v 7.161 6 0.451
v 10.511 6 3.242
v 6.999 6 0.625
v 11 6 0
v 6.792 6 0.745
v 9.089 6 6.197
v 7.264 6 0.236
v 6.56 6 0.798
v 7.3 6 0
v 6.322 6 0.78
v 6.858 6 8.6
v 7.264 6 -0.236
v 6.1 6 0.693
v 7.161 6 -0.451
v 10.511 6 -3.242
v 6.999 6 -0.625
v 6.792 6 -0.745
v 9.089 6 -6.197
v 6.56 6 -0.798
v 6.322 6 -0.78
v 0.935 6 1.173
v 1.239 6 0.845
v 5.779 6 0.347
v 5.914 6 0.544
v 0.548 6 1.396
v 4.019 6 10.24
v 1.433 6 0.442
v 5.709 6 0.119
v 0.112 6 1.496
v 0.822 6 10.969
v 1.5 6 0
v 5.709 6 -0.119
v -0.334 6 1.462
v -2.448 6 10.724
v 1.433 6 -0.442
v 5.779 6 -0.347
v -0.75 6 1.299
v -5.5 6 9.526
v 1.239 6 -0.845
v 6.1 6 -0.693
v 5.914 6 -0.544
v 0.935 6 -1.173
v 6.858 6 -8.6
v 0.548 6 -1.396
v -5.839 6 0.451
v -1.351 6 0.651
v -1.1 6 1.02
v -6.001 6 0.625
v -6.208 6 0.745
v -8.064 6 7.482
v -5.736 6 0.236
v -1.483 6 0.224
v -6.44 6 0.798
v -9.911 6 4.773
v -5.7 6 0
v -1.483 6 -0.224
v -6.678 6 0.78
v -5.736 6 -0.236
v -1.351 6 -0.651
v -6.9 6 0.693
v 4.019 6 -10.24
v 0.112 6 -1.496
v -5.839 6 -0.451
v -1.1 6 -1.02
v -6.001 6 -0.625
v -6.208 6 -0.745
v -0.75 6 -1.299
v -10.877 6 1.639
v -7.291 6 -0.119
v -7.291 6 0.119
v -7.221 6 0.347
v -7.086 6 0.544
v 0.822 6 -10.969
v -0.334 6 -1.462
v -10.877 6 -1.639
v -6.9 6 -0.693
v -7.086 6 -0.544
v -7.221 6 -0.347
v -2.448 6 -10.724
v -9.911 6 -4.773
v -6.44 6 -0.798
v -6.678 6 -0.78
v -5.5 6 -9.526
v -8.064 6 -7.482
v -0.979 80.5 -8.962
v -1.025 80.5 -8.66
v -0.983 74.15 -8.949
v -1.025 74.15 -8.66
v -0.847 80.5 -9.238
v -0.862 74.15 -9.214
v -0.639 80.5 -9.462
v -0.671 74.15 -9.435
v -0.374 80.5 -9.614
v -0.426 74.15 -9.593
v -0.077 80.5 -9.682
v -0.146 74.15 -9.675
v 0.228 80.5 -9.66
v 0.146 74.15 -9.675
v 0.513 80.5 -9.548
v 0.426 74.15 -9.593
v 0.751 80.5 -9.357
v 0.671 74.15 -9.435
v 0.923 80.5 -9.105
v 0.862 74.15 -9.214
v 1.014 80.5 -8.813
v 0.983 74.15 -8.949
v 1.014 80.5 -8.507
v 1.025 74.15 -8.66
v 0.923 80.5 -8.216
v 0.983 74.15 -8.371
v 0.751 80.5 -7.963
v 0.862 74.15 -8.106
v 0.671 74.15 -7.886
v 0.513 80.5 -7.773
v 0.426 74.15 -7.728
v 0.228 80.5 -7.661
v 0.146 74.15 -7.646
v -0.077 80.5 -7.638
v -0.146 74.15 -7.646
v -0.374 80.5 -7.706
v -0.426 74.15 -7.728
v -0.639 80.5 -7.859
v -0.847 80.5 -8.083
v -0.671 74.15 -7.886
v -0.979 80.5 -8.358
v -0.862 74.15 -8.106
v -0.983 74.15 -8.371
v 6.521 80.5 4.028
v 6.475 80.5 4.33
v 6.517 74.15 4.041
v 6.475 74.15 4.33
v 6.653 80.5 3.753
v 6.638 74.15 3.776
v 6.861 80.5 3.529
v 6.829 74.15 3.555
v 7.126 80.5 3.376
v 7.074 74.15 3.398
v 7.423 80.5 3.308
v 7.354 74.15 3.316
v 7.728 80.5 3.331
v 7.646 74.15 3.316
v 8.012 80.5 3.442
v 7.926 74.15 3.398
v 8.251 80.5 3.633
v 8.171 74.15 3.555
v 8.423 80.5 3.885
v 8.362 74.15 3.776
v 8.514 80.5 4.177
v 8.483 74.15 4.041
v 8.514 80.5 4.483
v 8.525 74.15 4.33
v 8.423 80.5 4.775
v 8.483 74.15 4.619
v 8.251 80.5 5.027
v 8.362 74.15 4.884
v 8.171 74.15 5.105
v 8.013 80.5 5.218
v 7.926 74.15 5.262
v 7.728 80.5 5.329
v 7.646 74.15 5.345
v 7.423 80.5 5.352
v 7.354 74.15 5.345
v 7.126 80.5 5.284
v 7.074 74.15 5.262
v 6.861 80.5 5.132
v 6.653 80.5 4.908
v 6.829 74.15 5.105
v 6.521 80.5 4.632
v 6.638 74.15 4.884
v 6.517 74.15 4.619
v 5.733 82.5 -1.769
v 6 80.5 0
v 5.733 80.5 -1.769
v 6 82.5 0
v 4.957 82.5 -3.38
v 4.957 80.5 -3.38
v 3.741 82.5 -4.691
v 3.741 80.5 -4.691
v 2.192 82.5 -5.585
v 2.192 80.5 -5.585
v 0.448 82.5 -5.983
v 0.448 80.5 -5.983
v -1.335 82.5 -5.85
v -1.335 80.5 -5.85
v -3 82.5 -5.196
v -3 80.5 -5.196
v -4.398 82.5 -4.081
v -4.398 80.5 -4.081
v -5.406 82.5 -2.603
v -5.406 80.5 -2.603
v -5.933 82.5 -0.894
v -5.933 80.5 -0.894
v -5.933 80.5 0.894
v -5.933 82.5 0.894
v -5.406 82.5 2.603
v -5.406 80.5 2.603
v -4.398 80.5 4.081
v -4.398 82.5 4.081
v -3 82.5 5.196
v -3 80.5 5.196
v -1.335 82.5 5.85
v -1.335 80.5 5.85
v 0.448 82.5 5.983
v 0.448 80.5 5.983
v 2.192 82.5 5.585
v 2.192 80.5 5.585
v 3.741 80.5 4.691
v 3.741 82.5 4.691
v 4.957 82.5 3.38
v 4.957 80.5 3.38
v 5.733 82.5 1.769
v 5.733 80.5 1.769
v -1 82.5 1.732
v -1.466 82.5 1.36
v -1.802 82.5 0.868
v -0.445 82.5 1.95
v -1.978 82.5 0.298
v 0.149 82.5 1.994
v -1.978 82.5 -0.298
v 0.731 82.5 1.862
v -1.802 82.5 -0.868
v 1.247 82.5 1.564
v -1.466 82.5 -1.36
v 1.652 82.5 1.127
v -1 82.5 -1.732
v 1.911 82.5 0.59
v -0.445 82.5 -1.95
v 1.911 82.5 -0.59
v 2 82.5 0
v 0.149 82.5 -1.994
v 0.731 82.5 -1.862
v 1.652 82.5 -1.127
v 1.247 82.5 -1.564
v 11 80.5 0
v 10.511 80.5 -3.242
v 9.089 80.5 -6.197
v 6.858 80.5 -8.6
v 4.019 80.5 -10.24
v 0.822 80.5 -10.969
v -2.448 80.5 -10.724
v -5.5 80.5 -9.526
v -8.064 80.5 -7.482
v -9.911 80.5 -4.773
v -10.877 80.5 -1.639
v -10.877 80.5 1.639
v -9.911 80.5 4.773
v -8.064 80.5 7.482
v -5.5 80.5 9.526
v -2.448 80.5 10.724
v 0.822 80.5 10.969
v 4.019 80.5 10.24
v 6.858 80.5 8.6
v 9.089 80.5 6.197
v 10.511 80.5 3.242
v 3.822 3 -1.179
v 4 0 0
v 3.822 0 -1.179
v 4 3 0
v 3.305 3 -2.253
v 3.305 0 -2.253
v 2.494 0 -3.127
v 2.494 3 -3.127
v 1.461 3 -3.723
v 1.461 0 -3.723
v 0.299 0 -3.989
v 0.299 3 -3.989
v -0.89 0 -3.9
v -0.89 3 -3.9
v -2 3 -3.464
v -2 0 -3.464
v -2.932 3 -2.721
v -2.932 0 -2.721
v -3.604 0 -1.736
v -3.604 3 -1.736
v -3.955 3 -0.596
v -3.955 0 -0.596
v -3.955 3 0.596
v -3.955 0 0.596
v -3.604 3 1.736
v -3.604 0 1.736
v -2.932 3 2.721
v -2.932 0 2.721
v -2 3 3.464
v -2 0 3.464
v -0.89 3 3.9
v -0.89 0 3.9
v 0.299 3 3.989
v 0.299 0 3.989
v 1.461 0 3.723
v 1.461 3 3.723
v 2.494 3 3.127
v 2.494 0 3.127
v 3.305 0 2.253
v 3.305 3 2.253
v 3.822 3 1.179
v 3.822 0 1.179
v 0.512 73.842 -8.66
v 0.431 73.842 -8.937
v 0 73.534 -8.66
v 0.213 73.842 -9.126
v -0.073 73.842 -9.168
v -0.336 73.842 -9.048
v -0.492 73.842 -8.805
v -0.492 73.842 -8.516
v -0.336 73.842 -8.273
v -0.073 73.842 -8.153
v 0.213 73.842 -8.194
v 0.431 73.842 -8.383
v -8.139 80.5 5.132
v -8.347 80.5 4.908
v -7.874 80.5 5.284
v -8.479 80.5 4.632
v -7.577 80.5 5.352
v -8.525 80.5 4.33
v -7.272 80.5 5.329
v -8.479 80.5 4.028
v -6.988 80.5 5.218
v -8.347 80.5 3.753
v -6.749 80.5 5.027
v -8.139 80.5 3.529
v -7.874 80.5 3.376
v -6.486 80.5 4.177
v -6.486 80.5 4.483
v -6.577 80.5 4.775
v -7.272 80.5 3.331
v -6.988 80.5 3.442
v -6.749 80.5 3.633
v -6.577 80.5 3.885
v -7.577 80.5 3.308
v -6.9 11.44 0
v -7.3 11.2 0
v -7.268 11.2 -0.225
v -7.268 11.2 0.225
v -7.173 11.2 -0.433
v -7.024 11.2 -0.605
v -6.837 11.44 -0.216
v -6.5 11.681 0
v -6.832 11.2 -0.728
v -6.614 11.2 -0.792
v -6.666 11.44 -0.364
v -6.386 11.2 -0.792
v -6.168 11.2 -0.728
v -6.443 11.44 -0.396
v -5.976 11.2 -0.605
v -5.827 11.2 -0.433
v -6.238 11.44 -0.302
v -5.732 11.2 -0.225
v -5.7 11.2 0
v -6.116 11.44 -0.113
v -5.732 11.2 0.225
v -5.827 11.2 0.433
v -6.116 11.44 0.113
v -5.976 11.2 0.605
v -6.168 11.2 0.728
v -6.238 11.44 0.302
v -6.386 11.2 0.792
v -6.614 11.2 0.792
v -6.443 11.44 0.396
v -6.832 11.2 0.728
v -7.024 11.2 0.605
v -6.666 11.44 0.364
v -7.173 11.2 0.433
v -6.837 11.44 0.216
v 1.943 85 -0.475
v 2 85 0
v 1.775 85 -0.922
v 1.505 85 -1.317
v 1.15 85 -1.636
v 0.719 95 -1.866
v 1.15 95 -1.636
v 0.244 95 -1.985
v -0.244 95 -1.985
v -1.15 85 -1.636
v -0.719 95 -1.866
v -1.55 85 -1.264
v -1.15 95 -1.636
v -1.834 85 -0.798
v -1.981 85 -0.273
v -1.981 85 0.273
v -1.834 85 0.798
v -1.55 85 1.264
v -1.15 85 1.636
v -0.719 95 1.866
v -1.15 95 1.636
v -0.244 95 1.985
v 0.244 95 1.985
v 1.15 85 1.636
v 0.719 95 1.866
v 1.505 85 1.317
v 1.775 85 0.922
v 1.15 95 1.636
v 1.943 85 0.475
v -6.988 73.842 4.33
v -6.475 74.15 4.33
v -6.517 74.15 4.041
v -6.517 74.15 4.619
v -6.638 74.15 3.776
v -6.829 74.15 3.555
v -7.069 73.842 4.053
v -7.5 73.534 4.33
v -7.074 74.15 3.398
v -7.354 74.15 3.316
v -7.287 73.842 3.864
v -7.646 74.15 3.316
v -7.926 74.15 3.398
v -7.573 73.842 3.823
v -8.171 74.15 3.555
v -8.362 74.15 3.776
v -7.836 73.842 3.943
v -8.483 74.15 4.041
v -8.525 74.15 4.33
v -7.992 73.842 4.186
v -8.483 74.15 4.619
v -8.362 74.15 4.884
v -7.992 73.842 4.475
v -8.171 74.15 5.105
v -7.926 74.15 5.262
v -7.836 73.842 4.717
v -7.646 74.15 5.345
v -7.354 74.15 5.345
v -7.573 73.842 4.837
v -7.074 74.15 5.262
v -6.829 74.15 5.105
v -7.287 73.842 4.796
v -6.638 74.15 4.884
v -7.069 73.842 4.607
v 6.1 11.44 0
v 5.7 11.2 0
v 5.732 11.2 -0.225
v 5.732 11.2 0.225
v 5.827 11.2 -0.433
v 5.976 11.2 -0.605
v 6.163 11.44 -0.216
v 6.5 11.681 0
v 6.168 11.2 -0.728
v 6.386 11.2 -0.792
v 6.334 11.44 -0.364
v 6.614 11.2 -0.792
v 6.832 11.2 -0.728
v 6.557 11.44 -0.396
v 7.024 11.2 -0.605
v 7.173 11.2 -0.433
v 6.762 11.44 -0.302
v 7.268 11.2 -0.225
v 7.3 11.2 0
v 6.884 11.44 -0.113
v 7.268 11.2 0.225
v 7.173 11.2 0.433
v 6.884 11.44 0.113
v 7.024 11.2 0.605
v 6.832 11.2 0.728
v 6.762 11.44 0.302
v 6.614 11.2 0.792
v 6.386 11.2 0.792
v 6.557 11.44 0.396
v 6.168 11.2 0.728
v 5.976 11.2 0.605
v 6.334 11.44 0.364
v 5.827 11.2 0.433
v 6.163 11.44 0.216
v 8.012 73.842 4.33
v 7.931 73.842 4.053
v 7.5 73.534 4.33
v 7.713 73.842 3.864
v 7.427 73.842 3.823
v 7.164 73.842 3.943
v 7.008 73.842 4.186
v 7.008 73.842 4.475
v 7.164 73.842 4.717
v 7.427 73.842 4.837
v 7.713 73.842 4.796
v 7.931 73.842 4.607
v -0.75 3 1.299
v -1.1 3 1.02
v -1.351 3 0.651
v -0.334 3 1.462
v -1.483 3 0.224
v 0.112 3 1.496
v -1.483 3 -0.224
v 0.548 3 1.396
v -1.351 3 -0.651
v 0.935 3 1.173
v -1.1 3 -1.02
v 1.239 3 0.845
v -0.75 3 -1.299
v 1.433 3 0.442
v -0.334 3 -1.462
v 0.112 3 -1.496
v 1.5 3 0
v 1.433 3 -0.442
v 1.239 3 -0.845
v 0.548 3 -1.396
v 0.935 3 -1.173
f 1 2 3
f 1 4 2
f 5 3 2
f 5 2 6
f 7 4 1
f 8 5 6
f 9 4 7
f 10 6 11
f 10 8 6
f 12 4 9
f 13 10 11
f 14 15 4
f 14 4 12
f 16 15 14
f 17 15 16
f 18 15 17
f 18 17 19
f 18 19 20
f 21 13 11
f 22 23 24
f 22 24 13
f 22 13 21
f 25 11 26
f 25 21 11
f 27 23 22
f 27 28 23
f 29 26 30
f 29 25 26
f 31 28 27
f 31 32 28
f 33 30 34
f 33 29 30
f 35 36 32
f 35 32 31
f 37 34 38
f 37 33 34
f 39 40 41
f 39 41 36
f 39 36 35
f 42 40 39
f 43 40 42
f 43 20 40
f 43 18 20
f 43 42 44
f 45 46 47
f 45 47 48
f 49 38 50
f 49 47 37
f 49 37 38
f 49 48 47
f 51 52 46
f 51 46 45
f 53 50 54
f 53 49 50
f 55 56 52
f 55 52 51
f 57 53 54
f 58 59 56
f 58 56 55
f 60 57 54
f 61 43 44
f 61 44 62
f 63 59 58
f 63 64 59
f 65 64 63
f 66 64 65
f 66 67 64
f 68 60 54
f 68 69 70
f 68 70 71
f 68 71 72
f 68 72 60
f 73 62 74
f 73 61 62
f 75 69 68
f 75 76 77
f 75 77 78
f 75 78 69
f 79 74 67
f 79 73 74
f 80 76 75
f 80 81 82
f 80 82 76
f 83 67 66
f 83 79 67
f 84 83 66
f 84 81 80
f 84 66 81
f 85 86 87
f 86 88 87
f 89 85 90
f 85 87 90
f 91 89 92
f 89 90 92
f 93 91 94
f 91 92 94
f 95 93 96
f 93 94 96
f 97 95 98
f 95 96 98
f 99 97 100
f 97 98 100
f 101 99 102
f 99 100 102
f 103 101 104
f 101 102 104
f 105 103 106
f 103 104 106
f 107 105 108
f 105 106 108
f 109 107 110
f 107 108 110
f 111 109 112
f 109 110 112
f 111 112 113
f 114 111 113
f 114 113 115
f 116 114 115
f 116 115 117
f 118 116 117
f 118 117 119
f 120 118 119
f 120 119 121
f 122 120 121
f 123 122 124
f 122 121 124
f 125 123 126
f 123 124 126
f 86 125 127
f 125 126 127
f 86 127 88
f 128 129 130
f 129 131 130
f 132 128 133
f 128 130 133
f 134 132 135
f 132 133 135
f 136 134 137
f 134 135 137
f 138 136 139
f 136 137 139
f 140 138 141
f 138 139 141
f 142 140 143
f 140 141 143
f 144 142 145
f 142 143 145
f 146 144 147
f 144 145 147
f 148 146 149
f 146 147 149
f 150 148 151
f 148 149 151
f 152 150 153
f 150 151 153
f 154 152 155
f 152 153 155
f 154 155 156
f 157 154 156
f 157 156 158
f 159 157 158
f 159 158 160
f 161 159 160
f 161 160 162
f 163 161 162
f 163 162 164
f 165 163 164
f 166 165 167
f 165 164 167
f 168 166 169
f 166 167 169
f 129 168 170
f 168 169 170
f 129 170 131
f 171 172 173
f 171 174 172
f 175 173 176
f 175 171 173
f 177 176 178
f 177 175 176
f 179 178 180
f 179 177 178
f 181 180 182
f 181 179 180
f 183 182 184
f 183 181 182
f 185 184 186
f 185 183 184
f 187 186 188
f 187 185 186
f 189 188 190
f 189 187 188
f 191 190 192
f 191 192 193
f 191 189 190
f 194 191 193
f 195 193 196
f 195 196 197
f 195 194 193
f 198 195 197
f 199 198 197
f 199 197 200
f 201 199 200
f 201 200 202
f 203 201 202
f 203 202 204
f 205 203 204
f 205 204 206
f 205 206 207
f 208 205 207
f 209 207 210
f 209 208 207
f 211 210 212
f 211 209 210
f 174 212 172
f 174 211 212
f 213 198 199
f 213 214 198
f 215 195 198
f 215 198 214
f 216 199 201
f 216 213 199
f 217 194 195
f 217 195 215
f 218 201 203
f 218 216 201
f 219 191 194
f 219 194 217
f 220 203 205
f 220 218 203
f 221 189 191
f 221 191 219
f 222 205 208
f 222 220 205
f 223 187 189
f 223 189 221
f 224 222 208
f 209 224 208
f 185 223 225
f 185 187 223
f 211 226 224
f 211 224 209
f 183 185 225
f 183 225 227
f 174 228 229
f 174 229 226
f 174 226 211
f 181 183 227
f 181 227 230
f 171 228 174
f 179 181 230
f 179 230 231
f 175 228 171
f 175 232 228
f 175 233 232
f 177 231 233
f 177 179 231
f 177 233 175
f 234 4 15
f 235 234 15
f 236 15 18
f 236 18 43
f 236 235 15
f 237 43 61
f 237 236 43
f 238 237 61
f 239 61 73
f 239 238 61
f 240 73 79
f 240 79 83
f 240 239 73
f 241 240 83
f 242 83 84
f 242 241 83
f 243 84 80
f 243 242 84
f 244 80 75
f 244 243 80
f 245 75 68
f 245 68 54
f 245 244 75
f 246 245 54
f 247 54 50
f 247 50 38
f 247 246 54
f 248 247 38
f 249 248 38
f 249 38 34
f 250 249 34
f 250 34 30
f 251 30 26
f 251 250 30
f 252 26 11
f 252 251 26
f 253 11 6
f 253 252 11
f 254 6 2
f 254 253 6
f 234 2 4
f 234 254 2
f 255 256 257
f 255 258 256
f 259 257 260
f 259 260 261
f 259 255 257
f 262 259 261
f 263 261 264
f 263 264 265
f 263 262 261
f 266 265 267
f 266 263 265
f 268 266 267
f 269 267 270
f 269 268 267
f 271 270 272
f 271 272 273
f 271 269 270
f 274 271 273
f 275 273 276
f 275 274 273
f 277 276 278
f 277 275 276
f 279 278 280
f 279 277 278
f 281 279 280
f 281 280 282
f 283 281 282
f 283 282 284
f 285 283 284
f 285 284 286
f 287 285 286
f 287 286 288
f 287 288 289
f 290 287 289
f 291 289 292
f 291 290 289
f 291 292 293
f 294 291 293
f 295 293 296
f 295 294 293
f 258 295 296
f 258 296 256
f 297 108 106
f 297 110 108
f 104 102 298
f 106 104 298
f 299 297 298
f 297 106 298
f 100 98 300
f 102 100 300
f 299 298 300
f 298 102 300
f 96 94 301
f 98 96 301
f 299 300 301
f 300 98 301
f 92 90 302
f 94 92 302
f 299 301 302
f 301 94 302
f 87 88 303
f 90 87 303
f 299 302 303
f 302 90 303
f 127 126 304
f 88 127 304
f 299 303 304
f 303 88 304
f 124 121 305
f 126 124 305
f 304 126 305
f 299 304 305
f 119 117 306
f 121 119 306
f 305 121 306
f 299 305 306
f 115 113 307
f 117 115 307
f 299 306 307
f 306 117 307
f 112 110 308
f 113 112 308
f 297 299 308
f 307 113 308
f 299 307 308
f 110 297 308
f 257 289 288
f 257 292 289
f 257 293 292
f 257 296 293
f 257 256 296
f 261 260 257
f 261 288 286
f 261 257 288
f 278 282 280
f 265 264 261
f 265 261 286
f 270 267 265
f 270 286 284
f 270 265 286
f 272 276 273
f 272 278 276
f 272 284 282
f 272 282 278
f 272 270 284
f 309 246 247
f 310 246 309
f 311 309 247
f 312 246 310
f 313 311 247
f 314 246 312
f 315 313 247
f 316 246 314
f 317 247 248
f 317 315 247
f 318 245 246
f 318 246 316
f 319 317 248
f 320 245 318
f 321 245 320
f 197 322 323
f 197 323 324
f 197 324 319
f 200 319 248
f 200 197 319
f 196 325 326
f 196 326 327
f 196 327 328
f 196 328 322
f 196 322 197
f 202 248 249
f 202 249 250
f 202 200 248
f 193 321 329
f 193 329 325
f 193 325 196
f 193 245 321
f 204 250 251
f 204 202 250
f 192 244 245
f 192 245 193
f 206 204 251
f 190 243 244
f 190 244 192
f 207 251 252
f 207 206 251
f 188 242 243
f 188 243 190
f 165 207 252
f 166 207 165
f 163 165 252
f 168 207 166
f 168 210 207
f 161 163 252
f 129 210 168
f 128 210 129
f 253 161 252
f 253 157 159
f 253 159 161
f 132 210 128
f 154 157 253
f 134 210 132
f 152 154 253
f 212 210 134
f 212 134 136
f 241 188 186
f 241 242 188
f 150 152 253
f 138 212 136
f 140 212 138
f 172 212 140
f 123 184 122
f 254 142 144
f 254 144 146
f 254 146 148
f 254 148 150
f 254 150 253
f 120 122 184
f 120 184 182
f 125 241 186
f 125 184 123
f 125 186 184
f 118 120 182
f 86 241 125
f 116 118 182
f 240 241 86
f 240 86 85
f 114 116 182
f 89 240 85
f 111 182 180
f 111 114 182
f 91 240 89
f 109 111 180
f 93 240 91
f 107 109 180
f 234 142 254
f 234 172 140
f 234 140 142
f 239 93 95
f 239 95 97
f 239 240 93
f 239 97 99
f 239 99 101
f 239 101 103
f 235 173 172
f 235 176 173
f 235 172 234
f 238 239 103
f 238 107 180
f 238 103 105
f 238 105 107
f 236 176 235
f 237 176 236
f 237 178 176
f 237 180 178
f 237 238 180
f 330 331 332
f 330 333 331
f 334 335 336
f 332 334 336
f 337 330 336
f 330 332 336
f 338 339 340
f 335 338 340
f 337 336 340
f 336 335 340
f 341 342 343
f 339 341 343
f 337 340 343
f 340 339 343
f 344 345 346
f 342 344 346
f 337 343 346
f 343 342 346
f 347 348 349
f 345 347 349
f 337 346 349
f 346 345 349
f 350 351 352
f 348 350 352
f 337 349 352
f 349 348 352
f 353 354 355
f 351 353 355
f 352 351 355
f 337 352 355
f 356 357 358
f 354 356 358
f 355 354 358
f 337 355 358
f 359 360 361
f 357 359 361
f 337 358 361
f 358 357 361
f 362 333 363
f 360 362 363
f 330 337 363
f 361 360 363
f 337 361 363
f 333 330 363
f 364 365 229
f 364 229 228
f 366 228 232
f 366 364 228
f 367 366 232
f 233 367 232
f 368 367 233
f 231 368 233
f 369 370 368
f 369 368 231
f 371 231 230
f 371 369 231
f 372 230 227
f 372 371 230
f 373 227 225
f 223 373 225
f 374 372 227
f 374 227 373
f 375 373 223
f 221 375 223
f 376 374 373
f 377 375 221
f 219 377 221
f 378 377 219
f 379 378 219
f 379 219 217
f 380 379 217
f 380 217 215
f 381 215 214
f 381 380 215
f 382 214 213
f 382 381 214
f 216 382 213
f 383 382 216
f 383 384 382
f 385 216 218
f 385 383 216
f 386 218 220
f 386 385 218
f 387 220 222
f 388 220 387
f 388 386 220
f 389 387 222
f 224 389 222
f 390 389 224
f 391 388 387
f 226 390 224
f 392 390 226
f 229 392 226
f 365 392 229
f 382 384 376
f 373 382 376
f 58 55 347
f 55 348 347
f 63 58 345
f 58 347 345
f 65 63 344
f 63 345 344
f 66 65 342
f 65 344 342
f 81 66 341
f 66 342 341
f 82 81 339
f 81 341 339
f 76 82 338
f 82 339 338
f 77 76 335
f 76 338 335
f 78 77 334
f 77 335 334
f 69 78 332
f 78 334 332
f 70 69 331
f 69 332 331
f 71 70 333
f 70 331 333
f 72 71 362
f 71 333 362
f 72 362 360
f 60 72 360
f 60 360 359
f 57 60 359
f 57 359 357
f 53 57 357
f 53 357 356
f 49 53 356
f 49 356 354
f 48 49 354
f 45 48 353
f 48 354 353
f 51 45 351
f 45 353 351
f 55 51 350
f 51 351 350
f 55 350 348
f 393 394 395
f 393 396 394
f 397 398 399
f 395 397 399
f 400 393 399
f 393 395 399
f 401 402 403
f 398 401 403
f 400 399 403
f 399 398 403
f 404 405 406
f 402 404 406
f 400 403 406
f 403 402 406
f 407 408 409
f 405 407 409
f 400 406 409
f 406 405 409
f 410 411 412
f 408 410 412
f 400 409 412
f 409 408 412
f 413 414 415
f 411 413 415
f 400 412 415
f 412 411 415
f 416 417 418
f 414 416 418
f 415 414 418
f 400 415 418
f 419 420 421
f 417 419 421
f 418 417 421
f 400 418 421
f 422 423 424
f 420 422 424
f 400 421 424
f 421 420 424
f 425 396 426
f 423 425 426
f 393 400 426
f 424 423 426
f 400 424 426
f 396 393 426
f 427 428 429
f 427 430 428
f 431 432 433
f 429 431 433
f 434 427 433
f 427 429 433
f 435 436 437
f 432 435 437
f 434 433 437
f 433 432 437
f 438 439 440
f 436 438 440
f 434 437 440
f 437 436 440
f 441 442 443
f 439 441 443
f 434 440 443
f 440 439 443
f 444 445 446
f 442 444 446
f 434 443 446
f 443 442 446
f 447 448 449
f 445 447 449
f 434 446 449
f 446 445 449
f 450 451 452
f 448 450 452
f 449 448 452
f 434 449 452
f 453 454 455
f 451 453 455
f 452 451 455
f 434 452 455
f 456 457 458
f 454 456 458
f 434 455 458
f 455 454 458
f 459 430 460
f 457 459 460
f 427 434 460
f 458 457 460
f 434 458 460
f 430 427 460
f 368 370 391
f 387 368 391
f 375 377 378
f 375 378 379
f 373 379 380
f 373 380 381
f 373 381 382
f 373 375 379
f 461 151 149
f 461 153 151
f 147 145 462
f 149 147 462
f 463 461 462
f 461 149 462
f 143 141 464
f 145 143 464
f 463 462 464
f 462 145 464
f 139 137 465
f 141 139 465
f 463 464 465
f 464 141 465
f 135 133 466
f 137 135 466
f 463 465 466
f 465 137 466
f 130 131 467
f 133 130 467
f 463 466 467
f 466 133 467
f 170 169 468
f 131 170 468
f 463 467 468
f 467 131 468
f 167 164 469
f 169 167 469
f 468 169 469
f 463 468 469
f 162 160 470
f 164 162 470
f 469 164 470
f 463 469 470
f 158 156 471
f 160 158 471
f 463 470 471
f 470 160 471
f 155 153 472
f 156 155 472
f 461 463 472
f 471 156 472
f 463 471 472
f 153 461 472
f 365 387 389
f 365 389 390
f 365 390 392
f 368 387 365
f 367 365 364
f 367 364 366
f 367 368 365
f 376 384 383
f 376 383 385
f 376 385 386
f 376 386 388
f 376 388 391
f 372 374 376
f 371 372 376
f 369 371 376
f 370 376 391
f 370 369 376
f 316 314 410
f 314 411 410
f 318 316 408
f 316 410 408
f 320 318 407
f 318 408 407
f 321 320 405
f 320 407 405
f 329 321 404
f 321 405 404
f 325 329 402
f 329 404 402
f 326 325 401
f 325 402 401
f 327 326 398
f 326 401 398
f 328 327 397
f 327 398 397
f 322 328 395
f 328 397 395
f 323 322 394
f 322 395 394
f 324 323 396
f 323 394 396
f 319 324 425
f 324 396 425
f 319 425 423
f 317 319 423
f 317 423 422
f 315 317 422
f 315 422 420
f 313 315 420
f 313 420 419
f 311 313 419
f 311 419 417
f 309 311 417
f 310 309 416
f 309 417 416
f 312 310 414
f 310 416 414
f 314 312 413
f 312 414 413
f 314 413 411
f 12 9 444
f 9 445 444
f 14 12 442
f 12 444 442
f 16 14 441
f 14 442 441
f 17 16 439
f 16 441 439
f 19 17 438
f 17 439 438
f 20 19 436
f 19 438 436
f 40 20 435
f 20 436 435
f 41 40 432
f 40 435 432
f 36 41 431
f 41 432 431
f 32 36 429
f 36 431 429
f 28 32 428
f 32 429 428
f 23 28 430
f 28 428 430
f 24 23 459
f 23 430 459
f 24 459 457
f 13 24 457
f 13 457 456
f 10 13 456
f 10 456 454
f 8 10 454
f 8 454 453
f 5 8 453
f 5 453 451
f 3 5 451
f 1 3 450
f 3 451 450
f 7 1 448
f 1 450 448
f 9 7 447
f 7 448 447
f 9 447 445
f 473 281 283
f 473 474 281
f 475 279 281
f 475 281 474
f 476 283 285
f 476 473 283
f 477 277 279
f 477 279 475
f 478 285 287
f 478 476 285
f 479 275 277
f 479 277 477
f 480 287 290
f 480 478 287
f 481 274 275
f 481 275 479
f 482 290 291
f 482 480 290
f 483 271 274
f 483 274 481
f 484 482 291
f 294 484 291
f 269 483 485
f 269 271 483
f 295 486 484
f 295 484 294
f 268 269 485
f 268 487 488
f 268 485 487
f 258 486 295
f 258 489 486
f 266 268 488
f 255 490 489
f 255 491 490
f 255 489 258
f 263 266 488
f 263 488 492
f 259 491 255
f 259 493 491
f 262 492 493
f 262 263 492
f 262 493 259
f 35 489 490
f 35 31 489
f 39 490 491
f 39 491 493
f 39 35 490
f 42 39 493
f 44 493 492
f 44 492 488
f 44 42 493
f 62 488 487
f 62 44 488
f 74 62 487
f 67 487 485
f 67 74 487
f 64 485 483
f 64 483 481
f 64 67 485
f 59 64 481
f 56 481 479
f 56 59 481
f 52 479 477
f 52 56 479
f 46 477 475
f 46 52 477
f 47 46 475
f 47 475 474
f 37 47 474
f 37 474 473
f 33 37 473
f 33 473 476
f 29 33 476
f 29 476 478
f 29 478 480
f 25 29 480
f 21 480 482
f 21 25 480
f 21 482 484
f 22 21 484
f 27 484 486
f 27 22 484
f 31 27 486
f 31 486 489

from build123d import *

# Parameters (mm, degrees)
CUT_EXTRUDE_1_DEPTH      = 10
HOLE_WIZARD_M2_5_1_D     = 2.05
HOLE_WIZARD_M2_5_1_DEPTH = 6.35
HOLE_WIZARD_M2_5_1_TIP   = 0.615882135
HOLE_WIZARD_M2_1_D       = 1.6
HOLE_WIZARD_M2_1_DEPTH   = 5.2
HOLE_WIZARD_M2_1_TIP     = 0.480688495


with BuildPart() as part:
    # 草图1 → 旋转1 (revolve)
    with BuildSketch(Plane.XY):
        Polygon((0, 0), (4, 0), (4, 3), (1.5, 3), (1.5, 6), (11, 6), (11, 80.5), (6, 80.5), (6, 82.5), (2, 82.5), (2, 95), (0, 95), align=None)
    revolve(axis=Axis((0, 0, 0), (0, 1, 0)))

    # 草图2 → 切除-拉伸1 (cut)
    with BuildSketch(Plane(origin=(0, 95, 0), x_dir=(1, 0, 0), z_dir=(0, 1, 0))):
        with BuildLine():
            Line((-1.15, -1.636306817), (-1.15, 1.636306817))
            ThreePointArc((-1.15, 1.636306817), (-2, 0), (-1.15, -1.636306817))
        make_face()
        with BuildLine():
            ThreePointArc((2, 0), (1.774823935, 0.921954446), (1.15, 1.636306817))
            Line((1.15, 1.636306817), (1.15, -1.636306817))
            ThreePointArc((1.15, -1.636306817), (1.774823935, -0.921954446), (2, 0))
        make_face()
    extrude(amount=-CUT_EXTRUDE_1_DEPTH, mode=Mode.SUBTRACT)

    # M2.5 螺纹孔1
    with Locations(Plane(origin=(0, 80.5, 0), x_dir=(1, 0, 0), z_dir=(0, 1, 0))):
        with Locations((0, 8.660254038), (-7.5, -4.330127019), (7.5, -4.330127019)):
            Hole(HOLE_WIZARD_M2_5_1_D / 2, depth=HOLE_WIZARD_M2_5_1_DEPTH)
            with Locations((0, 0, -(HOLE_WIZARD_M2_5_1_DEPTH + HOLE_WIZARD_M2_5_1_TIP / 2))):  # 118° drill point
                Cone(0, HOLE_WIZARD_M2_5_1_D / 2, HOLE_WIZARD_M2_5_1_TIP, mode=Mode.SUBTRACT)

    # M2 螺纹孔1
    with Locations(Plane(origin=(0, 6, 0), x_dir=(-1, 0, 0), z_dir=(0, -1, 0))):
        with Locations((-6.5, 0), (6.5, 0)):
            Hole(HOLE_WIZARD_M2_1_D / 2, depth=HOLE_WIZARD_M2_1_DEPTH)
            with Locations((0, 0, -(HOLE_WIZARD_M2_1_DEPTH + HOLE_WIZARD_M2_1_TIP / 2))):  # 118° drill point
                Cone(0, HOLE_WIZARD_M2_1_D / 2, HOLE_WIZARD_M2_1_TIP, mode=Mode.SUBTRACT)


solid = part.part
